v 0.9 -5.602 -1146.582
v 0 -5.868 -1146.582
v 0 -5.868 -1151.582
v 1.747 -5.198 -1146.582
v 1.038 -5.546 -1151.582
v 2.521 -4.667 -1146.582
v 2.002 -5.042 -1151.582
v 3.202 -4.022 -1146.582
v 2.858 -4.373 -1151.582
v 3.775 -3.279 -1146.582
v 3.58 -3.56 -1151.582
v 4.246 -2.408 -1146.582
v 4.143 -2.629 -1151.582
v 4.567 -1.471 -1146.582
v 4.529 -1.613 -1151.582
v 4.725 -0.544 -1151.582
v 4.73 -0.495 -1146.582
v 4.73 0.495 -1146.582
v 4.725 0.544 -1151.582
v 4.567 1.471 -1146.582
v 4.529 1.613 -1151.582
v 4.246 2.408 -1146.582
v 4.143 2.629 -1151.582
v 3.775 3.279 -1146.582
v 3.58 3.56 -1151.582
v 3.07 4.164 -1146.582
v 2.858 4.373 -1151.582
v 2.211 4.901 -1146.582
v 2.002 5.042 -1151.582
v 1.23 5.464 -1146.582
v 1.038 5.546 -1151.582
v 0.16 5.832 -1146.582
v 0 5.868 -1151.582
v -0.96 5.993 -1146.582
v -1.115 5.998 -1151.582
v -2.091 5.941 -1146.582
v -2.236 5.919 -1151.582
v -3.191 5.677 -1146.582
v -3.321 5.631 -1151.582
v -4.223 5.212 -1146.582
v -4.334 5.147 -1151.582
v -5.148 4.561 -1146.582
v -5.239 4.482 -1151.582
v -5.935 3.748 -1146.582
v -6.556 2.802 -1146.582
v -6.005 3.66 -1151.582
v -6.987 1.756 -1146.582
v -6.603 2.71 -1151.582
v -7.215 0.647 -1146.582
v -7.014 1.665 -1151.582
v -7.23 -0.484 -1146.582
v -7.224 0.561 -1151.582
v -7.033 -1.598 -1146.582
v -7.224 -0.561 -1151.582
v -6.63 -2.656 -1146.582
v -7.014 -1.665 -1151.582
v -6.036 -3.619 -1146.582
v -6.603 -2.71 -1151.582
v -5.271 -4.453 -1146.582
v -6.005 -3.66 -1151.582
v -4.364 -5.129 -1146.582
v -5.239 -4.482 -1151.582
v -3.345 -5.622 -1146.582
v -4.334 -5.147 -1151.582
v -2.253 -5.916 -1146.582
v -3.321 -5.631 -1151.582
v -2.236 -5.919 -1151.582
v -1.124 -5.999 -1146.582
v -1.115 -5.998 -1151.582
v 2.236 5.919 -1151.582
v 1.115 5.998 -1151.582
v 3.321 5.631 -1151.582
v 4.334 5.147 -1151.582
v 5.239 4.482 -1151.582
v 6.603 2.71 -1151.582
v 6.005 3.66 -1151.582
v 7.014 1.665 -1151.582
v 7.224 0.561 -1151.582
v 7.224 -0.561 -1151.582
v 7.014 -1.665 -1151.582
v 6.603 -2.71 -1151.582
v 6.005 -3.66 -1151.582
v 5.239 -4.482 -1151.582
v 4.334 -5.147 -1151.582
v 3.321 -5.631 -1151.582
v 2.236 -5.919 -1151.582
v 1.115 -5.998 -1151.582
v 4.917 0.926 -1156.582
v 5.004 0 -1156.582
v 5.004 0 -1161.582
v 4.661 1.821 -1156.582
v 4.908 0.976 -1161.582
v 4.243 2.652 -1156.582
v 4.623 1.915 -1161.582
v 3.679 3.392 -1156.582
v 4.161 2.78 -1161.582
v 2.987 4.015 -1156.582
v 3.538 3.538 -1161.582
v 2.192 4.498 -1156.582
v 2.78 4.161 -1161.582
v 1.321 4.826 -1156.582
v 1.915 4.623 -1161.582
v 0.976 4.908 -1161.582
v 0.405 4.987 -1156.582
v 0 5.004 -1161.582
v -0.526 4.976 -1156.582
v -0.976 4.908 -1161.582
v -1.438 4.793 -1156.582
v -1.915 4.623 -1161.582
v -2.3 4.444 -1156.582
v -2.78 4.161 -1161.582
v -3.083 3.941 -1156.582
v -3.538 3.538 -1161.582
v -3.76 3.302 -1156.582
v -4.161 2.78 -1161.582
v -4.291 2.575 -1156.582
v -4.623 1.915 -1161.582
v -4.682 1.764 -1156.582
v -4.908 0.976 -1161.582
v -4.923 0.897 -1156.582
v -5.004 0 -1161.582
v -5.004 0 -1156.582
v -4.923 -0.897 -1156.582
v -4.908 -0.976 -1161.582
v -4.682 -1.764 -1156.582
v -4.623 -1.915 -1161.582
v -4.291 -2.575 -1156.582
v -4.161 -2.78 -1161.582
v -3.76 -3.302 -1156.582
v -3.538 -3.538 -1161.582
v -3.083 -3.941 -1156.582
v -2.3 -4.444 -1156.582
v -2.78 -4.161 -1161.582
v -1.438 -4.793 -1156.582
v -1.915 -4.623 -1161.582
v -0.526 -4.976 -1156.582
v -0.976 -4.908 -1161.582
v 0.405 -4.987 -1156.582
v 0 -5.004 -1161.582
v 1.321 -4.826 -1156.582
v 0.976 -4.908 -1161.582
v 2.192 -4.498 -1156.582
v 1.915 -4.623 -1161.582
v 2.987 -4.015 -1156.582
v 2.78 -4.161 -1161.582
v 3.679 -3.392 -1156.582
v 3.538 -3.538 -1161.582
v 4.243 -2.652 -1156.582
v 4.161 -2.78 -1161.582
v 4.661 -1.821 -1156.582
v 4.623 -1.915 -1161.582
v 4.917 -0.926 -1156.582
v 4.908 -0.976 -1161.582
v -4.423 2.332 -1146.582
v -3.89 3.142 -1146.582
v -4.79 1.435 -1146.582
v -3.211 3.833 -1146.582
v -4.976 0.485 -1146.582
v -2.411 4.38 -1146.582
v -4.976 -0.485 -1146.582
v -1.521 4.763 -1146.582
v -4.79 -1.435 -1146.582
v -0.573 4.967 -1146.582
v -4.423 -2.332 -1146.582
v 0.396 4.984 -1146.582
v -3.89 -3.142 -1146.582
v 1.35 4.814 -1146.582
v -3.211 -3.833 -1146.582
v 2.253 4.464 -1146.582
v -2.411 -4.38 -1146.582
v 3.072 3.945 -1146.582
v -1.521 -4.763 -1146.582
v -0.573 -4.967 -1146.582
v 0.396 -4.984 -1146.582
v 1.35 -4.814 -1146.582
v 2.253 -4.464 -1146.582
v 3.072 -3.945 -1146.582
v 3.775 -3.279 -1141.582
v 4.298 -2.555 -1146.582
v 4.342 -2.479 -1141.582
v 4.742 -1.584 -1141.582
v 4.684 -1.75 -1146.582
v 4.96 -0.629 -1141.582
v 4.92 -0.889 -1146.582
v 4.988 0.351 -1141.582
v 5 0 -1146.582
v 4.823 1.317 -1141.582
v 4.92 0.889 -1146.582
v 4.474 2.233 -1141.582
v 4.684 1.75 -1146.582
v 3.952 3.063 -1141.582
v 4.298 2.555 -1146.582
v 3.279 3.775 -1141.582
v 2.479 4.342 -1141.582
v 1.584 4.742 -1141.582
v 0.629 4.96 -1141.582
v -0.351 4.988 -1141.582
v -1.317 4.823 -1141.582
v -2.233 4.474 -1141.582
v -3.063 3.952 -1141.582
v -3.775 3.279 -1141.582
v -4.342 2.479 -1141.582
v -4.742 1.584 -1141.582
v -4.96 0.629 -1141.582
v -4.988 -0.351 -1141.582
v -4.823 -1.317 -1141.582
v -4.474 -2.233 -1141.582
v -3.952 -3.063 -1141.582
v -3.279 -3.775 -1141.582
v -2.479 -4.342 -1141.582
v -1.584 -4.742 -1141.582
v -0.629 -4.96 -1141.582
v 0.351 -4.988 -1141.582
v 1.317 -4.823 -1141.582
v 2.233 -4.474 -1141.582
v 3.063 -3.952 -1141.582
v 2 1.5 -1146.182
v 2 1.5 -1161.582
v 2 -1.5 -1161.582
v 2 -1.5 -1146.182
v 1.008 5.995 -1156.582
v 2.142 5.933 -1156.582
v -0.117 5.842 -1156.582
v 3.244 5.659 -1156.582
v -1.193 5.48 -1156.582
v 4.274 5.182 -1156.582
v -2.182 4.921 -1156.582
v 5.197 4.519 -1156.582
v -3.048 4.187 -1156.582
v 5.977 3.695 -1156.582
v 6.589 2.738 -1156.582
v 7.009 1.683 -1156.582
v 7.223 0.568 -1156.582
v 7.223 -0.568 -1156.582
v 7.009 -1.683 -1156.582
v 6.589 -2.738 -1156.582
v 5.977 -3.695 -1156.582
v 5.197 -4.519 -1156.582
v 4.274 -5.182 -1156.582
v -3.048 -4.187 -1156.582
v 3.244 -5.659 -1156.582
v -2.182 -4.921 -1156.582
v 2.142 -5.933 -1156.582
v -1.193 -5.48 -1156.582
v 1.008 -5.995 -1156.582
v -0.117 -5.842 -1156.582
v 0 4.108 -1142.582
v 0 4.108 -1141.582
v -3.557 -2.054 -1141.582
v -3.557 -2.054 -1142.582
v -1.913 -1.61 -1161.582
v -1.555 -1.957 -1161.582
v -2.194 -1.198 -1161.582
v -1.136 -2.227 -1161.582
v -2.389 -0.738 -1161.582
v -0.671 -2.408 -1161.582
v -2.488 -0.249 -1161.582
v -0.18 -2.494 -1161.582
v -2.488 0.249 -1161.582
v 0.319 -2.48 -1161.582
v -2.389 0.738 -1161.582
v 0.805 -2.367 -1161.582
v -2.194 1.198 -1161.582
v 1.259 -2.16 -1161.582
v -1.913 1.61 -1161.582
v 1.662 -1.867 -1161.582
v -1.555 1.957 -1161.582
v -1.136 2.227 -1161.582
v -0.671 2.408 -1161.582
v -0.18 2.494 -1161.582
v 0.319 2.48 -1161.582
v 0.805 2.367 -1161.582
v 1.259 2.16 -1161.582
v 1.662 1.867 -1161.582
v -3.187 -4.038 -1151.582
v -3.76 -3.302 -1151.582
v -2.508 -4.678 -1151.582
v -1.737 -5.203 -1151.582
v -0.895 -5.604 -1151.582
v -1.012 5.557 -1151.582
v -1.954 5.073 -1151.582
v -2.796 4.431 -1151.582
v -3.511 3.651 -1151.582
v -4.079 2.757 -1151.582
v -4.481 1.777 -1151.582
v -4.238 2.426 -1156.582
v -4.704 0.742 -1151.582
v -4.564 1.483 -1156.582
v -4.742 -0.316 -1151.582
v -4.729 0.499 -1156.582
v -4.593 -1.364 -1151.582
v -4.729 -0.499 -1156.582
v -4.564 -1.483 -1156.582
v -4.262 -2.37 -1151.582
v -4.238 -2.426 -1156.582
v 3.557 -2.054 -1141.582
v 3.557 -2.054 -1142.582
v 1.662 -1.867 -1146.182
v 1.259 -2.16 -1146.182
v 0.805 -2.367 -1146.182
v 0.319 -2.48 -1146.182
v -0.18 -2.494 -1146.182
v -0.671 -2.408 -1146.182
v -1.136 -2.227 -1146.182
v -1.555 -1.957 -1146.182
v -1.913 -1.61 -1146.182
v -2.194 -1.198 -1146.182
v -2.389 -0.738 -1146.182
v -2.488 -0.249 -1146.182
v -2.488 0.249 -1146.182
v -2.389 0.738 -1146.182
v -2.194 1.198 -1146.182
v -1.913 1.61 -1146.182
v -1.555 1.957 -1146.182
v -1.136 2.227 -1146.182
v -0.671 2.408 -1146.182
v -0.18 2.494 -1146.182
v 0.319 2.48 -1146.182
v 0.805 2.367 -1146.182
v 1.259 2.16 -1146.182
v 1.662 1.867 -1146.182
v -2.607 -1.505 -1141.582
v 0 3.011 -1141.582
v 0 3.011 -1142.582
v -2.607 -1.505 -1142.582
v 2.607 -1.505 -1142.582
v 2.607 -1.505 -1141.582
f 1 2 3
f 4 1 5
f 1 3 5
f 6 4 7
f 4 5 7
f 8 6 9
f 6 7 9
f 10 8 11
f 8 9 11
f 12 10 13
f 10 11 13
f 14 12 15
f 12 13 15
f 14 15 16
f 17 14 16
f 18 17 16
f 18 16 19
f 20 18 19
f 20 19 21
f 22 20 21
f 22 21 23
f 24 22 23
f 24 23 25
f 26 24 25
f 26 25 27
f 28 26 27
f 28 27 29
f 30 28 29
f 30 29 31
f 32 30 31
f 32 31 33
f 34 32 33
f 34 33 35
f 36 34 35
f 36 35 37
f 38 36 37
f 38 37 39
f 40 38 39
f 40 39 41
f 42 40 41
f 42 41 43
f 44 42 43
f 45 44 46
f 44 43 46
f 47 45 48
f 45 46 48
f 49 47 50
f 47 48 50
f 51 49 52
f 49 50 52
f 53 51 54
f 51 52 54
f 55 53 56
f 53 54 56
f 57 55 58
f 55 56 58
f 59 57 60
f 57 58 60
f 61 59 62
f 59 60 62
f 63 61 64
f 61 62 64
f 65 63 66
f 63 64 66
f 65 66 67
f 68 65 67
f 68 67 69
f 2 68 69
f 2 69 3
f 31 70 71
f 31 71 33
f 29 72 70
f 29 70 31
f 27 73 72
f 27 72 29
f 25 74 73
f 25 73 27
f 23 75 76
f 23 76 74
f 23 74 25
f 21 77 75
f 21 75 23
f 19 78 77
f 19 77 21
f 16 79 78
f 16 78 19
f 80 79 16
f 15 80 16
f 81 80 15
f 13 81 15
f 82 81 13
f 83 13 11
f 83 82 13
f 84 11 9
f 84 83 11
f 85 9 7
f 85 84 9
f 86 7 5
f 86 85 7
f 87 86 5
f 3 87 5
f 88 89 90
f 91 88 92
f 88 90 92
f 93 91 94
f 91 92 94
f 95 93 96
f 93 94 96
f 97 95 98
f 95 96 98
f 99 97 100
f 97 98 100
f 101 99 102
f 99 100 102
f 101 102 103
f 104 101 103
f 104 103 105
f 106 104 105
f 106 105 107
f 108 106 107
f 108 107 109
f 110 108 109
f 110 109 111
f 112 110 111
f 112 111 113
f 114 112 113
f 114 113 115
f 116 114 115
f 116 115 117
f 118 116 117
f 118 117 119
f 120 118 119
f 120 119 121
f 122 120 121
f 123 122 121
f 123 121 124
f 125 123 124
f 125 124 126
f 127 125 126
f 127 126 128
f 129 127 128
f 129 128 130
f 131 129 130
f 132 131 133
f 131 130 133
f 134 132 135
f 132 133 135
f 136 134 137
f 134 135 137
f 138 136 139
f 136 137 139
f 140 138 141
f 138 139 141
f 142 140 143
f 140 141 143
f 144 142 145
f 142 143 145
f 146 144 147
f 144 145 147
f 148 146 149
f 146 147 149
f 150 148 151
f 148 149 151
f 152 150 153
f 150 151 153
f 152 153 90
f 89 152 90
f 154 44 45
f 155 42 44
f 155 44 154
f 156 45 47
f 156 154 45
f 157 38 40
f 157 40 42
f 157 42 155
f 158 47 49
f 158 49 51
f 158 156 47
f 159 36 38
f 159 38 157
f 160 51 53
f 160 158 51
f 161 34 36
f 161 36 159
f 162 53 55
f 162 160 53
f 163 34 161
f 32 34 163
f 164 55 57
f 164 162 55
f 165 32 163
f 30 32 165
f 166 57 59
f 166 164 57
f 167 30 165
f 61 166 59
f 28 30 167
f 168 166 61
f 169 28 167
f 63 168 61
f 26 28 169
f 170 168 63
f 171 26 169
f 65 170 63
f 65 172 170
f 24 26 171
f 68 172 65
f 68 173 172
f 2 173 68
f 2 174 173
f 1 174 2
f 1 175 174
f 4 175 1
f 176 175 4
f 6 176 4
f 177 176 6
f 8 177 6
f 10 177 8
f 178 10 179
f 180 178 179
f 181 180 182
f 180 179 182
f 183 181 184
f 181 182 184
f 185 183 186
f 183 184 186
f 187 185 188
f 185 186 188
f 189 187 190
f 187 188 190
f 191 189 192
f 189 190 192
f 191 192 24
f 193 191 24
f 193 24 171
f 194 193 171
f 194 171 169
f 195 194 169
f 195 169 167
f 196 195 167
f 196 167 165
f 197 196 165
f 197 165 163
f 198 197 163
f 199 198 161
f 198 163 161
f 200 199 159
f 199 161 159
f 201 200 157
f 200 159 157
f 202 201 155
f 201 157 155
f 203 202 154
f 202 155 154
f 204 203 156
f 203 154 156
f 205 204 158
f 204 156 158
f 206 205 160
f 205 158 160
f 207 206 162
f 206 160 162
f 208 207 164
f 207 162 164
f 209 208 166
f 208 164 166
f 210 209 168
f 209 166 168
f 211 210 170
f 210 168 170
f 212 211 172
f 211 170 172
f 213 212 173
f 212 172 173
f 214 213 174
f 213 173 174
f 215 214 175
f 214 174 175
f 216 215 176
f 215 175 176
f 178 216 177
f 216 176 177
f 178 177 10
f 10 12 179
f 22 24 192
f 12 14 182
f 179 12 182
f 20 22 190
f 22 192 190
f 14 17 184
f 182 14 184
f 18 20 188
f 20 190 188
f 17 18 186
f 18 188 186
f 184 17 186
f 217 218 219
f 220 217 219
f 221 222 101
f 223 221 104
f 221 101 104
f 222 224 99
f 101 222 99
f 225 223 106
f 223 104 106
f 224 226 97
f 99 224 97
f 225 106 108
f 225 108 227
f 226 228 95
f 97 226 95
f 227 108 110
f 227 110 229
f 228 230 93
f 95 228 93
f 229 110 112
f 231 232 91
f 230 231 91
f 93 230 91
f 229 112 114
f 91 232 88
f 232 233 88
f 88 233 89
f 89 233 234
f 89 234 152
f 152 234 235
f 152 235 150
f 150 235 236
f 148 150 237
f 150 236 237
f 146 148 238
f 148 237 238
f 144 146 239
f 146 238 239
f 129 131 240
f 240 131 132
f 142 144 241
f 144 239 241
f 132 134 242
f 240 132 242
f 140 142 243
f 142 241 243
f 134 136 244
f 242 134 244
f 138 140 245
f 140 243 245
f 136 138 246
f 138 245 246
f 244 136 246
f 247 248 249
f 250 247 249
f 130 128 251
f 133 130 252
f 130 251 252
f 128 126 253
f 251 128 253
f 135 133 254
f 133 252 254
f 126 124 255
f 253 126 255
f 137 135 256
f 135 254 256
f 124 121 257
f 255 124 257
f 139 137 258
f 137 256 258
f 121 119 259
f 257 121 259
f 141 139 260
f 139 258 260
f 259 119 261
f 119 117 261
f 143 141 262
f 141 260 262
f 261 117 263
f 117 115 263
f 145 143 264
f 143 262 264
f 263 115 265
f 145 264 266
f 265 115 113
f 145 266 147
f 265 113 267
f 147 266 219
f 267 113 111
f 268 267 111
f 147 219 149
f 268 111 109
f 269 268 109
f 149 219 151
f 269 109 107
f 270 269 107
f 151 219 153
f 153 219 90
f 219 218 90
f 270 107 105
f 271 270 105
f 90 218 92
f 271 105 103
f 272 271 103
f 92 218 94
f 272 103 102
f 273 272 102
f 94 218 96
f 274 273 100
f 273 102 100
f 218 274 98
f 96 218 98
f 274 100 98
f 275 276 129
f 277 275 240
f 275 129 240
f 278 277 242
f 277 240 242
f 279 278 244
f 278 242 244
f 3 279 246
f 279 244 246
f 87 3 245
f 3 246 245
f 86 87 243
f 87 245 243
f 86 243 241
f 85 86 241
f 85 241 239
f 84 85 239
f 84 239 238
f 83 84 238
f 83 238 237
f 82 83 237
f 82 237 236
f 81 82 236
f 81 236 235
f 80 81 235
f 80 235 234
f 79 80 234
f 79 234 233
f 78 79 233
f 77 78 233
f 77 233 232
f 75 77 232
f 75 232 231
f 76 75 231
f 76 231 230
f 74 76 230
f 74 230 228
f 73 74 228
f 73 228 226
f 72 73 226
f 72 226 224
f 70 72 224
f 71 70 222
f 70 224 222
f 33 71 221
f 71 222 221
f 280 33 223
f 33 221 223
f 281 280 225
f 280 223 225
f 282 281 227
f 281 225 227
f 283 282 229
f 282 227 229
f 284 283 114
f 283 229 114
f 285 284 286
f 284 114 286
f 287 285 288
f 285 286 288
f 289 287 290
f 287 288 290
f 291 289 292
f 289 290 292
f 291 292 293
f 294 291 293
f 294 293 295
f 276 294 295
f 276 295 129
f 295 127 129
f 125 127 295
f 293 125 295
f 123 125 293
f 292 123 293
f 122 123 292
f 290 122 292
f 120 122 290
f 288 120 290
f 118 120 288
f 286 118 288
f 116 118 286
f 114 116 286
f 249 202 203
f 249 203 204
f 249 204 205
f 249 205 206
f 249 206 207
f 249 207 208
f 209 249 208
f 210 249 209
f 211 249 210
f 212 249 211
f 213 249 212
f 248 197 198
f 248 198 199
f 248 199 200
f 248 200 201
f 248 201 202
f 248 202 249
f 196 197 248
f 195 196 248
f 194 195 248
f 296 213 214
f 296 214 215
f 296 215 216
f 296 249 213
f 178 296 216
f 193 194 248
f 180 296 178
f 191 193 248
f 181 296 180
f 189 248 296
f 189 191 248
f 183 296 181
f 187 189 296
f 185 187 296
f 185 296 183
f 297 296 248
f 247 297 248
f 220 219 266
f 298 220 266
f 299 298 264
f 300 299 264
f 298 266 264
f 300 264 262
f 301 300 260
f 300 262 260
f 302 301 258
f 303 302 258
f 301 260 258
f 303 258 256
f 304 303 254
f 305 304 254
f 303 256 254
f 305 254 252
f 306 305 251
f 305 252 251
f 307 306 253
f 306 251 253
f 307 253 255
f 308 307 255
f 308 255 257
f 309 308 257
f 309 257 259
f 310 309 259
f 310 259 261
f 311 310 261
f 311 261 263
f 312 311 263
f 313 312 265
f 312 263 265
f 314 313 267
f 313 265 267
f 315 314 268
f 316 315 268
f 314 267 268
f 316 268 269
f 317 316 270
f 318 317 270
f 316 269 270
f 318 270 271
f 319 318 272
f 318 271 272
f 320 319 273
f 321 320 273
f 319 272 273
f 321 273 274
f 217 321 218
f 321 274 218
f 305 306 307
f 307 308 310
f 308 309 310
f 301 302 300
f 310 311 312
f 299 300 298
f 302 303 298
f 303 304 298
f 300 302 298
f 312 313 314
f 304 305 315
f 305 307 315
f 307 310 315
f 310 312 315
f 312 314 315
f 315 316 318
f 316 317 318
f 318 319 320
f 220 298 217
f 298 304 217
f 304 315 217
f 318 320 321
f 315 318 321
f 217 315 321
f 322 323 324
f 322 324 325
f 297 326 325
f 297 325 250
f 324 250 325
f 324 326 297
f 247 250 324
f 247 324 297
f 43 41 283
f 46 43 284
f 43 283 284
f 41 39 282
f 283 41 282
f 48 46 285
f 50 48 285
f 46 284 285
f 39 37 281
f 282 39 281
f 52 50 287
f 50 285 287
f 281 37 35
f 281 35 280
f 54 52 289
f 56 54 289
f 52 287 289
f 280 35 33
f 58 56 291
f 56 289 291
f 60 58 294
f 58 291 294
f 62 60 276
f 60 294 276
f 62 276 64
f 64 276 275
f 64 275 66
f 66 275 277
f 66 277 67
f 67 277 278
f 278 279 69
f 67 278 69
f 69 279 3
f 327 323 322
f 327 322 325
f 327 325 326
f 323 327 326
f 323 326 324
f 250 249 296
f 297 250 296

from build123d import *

# Parameters (mm, degrees)
SKETCH2_R           = 5.0038
BOSS_EXTRUDE1_DEPTH = 5
SKETCH3_R           = 6
BOSS_EXTRUDE2_DEPTH = 5
SKETCH5_R           = 6
BOSS_EXTRUDE3_DEPTH = 5
SKETCH6_R           = 5
BOSS_EXTRUDE4_DEPTH = 5
SKETCH8_R           = 2.698107805
BOSS_EXTRUDE5_DEPTH = 4.6
CUT_EXTRUDE1_DEPTH  = 1


with BuildPart() as part:
    # Sketch2 → Boss-Extrude1 (new body)
    with BuildSketch(Plane.XY.offset(-1161.582265199)):
        Circle(SKETCH2_R)
        with BuildLine():
            Line((2, 1.5), (2, -1.5))
            ThreePointArc((2, -1.5), (-2.5, 0), (2, 1.5))
        make_face(mode=Mode.SUBTRACT)
    extrude(amount=BOSS_EXTRUDE1_DEPTH)

    # Sketch3 → Boss-Extrude2 (add)
    with BuildSketch(Plane.XY.offset(-1156.582265199)):
        with Locations(Location((1.25, 0, 0), (0, 0, 213.387732771))):
            Circle(SKETCH3_R)
        with BuildLine():
            Line((2, 1.5), (2, -1.5))
            ThreePointArc((2, -1.5), (-2.5, 0), (2, 1.5))
        make_face(mode=Mode.SUBTRACT)
    extrude(amount=BOSS_EXTRUDE2_DEPTH)

    # Sketch5 → Boss-Extrude3 (add)
    with BuildSketch(Plane.XY.offset(-1151.582265199)):
        with Locations(Location((-1.25, 0, 0), (0, 0, 282.024699181))):
            Circle(SKETCH5_R)
        with BuildLine():
            Line((2, 1.5), (2, -1.5))
            ThreePointArc((2, -1.5), (-2.5, 0), (2, 1.5))
        make_face(mode=Mode.SUBTRACT)
    extrude(amount=BOSS_EXTRUDE3_DEPTH)

    # Sketch6 → Boss-Extrude4 (add)
    with BuildSketch(Plane.XY.offset(-1146.582265199)):
        with Locations(Location((0, 0, 0), (0, 0, 319.025369771))):
            Circle(SKETCH6_R)
        with BuildLine():
            Line((2, 1.5), (2, -1.5))
            ThreePointArc((2, -1.5), (-2.5, 0), (2, 1.5))
        make_face(mode=Mode.SUBTRACT)
    extrude(amount=BOSS_EXTRUDE4_DEPTH)

    # Sketch8 → Boss-Extrude5 (add)
    with BuildSketch(Plane.XY.offset(-1146.182265199)):
        Circle(SKETCH8_R)
    extrude(amount=BOSS_EXTRUDE5_DEPTH)

    # Sketch9 → Cut-Extrude1 (cut)
    with BuildSketch(Plane.XY.offset(-1141.582265199)):
        Polygon((0, 4.107590662), (-3.557277862, -2.053795331), (3.557277862, -2.053795331), align=None)
        Polygon((0, 3.010552133), (-2.607214626, -1.505276066), (2.607214626, -1.505276066), align=None, mode=Mode.SUBTRACT)
    extrude(amount=-CUT_EXTRUDE1_DEPTH, mode=Mode.SUBTRACT)


solid = part.part
